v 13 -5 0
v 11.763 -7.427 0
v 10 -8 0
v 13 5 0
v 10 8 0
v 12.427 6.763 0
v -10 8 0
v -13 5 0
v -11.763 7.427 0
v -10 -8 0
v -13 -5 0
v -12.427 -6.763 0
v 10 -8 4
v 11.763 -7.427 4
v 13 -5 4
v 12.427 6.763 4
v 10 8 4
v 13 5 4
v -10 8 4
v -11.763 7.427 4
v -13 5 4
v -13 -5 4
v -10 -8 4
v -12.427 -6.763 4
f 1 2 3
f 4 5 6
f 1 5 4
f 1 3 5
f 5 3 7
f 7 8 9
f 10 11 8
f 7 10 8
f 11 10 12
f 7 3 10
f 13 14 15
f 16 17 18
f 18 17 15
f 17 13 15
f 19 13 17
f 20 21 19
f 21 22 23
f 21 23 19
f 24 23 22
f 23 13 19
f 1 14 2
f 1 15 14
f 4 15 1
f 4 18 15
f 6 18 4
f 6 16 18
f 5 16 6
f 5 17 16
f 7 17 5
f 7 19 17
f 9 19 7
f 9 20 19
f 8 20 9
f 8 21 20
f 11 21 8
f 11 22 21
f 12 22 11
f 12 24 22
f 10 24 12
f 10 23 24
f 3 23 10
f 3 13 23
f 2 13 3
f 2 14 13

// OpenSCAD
// offset() demo — rounded grow, straight delta, chamfered, and shrink.
linear_extrude(height=4) {
    offset(r=3) {
        square([20, 10], center=true);
    }
}

translate([40, 0, 0]) {
    offset(delta=3, chamfer=true) {
        square([20, 10], center=true);
    }
}

translate([0, 30, 0]) {
    offset(r=-2) {
        square([20, 10], center=true);
    }
}
